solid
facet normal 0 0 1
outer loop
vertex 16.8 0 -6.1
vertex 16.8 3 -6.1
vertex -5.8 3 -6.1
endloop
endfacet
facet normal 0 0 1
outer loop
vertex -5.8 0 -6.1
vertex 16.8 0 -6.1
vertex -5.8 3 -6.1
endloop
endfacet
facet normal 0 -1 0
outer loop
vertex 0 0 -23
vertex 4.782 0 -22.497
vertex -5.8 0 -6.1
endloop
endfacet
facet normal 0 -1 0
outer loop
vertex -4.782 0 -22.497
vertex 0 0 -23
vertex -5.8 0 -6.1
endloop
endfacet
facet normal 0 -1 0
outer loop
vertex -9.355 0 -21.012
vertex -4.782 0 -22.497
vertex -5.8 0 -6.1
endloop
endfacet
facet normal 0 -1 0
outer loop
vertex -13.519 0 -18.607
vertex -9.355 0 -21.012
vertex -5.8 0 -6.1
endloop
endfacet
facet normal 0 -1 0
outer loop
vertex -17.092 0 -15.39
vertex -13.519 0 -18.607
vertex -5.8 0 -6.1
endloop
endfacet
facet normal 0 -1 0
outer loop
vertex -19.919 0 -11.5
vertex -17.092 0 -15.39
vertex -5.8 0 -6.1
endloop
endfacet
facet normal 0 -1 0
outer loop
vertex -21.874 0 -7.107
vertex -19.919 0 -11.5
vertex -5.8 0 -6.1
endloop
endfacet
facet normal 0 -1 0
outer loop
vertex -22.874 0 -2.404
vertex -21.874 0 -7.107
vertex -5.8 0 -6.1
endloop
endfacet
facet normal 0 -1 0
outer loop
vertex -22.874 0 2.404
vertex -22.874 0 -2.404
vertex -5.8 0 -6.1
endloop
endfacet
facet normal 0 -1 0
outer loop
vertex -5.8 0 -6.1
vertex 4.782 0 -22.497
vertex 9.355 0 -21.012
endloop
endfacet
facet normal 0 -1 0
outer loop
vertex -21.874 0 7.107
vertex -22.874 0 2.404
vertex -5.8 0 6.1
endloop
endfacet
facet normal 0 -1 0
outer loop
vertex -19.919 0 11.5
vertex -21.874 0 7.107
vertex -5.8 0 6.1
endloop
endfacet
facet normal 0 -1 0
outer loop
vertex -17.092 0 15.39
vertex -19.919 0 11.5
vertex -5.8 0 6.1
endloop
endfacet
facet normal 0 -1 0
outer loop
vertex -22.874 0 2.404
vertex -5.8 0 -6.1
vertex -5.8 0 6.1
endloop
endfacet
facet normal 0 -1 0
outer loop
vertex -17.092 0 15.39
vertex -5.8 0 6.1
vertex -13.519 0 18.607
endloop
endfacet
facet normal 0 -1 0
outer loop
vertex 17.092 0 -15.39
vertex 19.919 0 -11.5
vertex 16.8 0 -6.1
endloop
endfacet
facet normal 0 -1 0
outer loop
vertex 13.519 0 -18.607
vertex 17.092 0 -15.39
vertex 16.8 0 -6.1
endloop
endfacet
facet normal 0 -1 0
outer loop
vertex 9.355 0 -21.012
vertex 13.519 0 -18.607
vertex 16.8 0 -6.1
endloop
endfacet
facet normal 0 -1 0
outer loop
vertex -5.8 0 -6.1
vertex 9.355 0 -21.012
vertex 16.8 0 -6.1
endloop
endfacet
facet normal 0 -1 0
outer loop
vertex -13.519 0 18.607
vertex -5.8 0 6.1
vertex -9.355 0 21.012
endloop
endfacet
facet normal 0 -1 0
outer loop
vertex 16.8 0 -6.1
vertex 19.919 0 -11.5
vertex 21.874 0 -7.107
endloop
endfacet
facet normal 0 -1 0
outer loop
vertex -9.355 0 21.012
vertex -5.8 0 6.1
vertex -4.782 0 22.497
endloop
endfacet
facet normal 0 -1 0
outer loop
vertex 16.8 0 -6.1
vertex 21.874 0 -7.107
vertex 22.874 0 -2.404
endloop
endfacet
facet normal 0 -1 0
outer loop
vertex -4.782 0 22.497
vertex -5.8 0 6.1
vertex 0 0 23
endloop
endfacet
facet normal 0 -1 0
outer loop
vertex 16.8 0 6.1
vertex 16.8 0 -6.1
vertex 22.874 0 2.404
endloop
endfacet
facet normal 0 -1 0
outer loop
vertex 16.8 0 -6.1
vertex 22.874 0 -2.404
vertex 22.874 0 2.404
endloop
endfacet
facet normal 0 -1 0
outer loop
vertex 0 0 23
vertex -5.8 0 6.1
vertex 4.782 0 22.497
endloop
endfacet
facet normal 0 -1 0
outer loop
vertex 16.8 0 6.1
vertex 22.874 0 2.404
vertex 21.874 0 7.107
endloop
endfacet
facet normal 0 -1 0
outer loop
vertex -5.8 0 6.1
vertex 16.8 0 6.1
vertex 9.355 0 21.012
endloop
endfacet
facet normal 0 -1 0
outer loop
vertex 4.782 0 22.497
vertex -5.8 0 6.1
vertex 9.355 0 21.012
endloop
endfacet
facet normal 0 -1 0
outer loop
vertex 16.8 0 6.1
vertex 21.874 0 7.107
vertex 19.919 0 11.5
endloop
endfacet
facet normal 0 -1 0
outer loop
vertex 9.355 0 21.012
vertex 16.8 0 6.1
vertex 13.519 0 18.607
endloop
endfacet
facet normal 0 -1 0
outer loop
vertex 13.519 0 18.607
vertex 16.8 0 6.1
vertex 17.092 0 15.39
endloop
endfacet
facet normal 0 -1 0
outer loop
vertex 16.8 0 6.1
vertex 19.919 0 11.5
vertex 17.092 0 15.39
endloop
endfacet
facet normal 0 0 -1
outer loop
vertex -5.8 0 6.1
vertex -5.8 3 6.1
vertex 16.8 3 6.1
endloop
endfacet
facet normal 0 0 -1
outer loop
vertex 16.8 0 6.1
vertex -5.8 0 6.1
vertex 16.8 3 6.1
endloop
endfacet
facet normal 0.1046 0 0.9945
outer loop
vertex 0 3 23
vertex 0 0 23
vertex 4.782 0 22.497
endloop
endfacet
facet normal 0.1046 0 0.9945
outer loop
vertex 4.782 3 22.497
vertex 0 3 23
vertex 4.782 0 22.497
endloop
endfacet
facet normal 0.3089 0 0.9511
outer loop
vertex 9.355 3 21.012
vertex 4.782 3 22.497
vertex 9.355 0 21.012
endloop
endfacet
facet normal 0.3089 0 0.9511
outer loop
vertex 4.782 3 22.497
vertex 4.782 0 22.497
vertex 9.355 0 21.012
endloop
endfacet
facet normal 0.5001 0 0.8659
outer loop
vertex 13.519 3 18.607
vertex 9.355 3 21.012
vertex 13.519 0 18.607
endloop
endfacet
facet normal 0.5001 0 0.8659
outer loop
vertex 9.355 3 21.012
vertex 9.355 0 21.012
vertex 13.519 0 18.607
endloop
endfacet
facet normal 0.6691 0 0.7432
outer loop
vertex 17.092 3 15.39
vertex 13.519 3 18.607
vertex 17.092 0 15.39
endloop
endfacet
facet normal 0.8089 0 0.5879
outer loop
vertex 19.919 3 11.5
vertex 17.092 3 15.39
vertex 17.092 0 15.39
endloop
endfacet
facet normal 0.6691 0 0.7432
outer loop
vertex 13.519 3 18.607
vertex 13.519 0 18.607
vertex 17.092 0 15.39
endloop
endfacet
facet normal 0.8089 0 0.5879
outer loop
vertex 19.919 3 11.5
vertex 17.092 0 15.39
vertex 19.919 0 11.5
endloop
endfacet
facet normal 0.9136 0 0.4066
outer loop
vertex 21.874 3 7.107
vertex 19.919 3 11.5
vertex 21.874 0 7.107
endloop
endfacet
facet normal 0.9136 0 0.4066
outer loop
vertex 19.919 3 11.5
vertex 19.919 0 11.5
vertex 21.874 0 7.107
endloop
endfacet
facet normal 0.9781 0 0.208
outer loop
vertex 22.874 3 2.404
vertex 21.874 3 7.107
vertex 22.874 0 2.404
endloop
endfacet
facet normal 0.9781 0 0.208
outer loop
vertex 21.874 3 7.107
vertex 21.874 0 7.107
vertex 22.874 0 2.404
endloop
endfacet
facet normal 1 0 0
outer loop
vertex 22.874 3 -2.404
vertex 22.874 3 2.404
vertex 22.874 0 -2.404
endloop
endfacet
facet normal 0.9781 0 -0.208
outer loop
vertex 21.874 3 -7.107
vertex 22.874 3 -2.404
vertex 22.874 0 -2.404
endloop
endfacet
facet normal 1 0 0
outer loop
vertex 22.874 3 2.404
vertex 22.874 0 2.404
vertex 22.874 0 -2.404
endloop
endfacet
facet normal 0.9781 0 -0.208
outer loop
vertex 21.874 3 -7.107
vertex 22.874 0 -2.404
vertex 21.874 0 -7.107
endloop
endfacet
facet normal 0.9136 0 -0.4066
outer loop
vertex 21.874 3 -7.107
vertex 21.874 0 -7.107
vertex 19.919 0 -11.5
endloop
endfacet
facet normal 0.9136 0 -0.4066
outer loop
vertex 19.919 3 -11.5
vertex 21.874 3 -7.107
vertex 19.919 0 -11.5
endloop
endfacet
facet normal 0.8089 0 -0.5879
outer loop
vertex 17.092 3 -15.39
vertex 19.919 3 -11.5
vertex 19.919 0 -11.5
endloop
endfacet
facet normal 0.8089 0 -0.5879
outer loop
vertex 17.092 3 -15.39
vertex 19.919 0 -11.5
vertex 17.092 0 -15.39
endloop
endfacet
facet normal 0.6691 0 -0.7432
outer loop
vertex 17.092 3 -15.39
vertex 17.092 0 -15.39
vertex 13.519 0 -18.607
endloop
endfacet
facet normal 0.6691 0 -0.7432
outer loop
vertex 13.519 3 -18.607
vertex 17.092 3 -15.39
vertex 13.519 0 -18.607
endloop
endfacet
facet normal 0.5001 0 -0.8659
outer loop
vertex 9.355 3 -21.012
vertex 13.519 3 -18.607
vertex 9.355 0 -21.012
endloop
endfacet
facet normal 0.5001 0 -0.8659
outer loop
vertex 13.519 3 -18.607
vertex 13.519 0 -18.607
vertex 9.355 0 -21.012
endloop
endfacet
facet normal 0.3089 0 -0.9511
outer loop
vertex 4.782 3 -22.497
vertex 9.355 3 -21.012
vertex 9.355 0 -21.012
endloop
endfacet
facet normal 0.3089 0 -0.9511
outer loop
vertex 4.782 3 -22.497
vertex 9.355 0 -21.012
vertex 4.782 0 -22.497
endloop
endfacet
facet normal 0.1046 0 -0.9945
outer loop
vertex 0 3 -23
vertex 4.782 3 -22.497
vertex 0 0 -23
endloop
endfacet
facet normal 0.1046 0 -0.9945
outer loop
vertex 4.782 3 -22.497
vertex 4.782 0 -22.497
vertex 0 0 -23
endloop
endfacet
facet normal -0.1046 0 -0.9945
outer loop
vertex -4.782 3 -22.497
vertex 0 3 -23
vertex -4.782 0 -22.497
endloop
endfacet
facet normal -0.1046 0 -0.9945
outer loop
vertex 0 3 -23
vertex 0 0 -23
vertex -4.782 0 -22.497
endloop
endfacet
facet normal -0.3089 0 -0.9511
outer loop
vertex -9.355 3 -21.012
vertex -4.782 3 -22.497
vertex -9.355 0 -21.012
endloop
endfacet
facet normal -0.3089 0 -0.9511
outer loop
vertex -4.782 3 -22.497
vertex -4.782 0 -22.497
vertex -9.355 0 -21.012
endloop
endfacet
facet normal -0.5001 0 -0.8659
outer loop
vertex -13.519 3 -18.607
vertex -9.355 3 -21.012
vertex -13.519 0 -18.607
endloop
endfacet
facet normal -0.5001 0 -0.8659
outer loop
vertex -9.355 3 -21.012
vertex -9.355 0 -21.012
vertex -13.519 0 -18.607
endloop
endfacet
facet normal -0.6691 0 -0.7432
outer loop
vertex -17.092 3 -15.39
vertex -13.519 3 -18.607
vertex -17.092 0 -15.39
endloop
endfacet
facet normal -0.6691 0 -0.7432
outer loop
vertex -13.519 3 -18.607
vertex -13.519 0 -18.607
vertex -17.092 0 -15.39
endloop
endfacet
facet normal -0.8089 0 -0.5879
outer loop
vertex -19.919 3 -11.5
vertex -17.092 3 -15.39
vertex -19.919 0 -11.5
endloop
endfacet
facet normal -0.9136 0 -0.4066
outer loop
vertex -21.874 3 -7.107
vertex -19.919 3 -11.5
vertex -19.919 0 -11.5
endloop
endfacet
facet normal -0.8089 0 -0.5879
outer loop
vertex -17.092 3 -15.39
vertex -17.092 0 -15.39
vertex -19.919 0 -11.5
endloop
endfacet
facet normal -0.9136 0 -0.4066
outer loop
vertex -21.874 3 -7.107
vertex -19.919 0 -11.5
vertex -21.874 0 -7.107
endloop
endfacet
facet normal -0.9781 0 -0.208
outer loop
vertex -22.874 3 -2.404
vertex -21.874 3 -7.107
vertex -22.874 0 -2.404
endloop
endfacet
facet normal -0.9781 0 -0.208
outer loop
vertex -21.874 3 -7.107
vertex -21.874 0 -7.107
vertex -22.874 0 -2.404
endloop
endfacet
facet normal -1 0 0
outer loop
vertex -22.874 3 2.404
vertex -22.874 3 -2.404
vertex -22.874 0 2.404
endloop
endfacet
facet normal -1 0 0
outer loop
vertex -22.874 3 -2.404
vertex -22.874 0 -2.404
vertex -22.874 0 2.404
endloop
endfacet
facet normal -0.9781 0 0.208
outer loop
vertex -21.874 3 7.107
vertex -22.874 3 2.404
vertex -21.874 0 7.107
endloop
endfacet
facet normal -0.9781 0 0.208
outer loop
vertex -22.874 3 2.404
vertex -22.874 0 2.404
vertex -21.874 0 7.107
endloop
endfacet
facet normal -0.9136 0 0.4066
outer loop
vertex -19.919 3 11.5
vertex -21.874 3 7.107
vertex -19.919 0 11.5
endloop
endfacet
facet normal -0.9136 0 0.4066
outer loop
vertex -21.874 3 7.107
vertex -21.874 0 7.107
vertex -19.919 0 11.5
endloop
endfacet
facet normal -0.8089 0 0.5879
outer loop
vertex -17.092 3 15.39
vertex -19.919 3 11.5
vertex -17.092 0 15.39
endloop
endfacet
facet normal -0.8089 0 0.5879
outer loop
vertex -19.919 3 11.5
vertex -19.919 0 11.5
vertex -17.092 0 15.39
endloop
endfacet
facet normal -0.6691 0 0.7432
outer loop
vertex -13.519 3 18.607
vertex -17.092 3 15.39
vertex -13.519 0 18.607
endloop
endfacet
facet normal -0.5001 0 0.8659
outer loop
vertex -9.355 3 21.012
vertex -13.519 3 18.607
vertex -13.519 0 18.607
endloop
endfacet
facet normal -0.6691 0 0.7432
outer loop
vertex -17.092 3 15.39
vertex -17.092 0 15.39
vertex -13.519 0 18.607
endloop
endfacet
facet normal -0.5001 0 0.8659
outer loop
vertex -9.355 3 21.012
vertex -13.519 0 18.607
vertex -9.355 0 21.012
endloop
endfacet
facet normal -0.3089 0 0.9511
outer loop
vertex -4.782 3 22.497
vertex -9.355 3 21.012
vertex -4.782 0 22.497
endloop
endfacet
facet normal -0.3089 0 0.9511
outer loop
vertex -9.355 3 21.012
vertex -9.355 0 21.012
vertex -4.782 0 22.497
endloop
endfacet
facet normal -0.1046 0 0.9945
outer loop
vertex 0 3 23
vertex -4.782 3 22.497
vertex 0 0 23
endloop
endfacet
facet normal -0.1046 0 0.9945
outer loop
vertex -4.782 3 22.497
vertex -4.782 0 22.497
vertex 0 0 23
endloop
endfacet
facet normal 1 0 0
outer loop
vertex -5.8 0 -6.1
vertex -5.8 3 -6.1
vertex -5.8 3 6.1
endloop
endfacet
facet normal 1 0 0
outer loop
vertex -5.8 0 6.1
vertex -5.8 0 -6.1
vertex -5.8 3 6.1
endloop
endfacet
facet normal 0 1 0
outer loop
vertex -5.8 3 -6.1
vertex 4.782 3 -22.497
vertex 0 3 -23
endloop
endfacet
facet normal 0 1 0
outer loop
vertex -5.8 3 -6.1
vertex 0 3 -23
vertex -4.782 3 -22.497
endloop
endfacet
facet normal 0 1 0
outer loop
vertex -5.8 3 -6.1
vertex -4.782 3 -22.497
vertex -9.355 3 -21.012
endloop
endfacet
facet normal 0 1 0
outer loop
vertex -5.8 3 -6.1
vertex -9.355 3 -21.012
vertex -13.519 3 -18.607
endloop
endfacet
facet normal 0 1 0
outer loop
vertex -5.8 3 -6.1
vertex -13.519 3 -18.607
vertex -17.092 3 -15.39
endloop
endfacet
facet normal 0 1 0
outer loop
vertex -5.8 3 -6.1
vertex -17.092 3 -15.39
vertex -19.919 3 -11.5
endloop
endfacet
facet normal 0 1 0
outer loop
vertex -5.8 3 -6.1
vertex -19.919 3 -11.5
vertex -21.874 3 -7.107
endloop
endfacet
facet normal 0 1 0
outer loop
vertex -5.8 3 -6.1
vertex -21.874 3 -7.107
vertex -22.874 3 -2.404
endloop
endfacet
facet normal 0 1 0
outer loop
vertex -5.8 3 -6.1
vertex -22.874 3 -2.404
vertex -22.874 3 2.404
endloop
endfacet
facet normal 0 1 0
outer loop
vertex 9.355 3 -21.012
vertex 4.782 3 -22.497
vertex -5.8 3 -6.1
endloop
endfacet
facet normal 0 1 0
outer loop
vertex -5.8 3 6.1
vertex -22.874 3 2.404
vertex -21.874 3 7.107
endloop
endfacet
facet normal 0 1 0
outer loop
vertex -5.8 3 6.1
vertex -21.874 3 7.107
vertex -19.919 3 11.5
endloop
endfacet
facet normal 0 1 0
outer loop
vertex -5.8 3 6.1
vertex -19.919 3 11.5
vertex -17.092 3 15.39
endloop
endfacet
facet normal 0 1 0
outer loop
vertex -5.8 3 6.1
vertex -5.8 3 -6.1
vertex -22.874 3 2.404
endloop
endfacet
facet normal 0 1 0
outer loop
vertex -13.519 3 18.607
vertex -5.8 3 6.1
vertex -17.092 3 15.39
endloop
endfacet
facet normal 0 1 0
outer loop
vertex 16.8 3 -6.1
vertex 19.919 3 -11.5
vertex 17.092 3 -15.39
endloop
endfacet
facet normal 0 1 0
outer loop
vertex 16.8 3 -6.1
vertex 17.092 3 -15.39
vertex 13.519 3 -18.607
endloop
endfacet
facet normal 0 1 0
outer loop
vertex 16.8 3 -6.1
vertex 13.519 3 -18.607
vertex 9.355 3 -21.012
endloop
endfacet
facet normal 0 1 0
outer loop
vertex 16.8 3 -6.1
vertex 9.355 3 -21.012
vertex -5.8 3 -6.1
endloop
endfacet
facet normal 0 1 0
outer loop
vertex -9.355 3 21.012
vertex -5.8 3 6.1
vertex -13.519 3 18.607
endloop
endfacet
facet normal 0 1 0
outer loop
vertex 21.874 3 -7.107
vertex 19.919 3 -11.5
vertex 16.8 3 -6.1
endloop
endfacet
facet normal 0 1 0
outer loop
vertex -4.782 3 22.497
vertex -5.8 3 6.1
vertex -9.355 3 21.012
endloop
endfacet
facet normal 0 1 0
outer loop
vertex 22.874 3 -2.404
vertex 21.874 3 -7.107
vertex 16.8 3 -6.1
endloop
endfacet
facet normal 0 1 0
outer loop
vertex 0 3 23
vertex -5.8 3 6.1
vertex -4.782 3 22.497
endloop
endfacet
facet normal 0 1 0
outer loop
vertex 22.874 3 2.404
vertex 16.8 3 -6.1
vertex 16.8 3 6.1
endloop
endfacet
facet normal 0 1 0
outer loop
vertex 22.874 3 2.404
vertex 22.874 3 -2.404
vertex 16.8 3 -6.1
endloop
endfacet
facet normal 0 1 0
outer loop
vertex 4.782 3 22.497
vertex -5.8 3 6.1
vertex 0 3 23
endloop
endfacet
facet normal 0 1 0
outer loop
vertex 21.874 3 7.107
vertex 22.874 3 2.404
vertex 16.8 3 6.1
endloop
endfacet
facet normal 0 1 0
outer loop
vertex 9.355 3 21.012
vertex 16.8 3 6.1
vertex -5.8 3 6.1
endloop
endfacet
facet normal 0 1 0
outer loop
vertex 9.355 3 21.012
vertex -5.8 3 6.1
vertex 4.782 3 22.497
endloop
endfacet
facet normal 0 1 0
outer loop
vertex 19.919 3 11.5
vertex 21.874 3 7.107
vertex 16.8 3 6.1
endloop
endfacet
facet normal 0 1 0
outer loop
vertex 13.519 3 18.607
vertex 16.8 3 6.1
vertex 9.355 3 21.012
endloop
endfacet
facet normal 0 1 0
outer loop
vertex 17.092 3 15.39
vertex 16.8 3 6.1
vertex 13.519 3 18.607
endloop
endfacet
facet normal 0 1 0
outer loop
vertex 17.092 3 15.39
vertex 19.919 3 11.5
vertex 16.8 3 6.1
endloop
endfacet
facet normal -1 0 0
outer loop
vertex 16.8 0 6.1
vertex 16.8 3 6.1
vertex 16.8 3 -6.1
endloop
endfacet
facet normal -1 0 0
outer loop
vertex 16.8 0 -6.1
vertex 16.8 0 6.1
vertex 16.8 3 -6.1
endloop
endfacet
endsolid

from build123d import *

# Parameters (mm, degrees)
SKETCH1_R           = 23
BOSS_EXTRUDE1_DEPTH = 3
SKETCH2_W           = 5.8
SKETCH2_H           = 6.1
SKETCH2_W_2         = 16.8
CUT_EXTRUDE1_DEPTH  = 10


with BuildPart() as part:
    # Sketch1 → Boss-Extrude1 (new body)
    with BuildSketch(Plane(origin=(0, 0, 0), x_dir=(1, 0, 0), z_dir=(0, 1, 0))):
        with Locations(Location((0, 0, 0), (0, 0, 270))):
            Circle(SKETCH1_R)
    extrude(amount=BOSS_EXTRUDE1_DEPTH)

    # Sketch2 → Cut-Extrude1 (cut)
    with BuildSketch(Plane(origin=(0, 3, 0), x_dir=(1, 0, 0), z_dir=(0, 1, 0))):
        with Locations((-2.9, 3.05)):
            Rectangle(SKETCH2_W, SKETCH2_H)
        with Locations((8.4, 3.05)):
            Rectangle(SKETCH2_W_2, SKETCH2_H)
        with Locations((8.4, -3.05)):
            Rectangle(SKETCH2_W_2, SKETCH2_H)
        with Locations((-2.9, -3.05)):
            Rectangle(SKETCH2_W, SKETCH2_H)
    extrude(amount=-CUT_EXTRUDE1_DEPTH, mode=Mode.SUBTRACT)


solid = part.part
